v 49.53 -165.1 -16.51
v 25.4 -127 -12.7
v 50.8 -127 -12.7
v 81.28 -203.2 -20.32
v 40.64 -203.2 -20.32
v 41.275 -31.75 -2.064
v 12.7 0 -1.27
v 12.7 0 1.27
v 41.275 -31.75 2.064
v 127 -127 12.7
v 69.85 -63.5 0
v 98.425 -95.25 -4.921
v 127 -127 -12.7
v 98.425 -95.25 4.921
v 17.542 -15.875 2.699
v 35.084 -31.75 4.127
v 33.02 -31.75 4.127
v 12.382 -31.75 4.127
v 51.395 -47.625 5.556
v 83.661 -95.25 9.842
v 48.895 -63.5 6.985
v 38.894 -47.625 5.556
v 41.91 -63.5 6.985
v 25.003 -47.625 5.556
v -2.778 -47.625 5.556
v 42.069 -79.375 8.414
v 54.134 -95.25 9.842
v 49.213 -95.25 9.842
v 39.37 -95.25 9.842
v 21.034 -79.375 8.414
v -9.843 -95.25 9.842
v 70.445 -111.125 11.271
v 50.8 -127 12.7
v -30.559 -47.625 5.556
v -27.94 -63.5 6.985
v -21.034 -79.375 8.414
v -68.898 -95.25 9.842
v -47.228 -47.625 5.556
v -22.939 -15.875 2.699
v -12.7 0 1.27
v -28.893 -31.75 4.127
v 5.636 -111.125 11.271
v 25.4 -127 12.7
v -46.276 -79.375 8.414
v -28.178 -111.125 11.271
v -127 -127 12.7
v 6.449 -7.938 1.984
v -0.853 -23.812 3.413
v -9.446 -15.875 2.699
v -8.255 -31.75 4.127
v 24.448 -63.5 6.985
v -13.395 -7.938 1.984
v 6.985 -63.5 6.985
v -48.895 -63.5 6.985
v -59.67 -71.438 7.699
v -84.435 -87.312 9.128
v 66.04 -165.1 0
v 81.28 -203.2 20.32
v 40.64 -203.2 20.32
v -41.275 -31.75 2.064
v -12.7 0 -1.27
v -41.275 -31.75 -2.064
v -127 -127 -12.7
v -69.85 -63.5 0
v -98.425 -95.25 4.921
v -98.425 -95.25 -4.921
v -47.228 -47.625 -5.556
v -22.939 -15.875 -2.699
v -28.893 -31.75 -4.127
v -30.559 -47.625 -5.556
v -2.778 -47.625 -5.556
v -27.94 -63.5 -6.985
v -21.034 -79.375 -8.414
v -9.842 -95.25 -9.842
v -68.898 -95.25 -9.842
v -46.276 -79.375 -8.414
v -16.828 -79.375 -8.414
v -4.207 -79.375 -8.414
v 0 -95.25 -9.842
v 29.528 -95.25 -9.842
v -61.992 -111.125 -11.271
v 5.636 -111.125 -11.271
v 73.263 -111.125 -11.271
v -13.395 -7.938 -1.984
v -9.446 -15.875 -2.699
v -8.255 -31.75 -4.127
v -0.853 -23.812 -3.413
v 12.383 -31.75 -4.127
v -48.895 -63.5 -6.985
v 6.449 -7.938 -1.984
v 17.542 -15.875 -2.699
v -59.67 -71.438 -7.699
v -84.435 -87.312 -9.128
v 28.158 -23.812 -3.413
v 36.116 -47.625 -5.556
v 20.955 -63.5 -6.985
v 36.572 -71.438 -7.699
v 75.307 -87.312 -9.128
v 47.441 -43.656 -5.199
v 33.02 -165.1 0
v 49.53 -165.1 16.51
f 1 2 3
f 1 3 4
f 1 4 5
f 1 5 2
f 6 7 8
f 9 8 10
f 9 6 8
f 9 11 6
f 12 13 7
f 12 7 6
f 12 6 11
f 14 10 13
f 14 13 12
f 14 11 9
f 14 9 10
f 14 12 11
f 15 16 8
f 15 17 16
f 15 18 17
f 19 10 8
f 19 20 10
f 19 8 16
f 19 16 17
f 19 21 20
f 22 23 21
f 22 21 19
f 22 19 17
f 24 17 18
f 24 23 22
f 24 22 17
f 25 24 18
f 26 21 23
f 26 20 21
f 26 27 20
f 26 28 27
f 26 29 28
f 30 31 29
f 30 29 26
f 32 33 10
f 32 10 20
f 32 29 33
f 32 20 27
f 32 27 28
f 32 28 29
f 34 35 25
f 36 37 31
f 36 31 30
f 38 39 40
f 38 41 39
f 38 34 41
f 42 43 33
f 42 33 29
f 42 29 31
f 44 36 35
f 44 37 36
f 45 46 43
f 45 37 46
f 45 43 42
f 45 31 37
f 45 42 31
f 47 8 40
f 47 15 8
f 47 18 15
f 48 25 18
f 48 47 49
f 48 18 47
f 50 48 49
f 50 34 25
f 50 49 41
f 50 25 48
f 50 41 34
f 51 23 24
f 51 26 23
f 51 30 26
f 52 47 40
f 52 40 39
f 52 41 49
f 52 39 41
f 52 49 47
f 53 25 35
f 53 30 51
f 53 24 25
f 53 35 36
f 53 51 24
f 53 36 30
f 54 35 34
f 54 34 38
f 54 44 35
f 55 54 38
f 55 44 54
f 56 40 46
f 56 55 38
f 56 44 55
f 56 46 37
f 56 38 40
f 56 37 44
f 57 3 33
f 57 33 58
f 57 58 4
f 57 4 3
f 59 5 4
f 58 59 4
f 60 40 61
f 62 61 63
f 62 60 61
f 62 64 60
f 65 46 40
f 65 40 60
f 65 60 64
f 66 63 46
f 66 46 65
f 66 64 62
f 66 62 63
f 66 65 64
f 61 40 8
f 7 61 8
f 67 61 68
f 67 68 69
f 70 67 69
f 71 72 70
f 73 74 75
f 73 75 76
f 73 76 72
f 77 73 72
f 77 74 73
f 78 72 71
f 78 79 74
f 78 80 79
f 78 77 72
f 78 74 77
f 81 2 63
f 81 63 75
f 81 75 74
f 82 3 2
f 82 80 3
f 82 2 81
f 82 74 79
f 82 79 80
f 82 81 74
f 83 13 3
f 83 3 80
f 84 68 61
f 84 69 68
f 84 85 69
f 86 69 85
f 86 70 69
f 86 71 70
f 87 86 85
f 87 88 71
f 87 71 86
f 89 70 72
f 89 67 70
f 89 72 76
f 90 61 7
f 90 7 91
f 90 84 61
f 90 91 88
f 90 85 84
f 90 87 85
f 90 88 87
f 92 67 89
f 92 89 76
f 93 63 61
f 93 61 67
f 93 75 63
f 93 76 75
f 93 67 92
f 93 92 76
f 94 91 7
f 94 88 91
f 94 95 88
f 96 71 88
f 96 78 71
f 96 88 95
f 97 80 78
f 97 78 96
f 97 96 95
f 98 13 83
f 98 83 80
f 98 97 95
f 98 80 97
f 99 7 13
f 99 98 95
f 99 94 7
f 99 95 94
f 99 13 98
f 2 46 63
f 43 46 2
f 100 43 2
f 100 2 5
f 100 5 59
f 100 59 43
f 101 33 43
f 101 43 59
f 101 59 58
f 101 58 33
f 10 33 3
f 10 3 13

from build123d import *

# Parameters (mm, degrees)
F0_W = 25.4
F0_H = 2.54
F2_W = 254
F2_H = 25.4
F4_W = 25.4
F4_H = 25.4
F6_W = 40.64
F6_H = 40.64


with BuildPart() as f3:
    # F0 (on Front) → F3 section 0
    with BuildSketch(Plane.XZ):
        Rectangle(F0_W, F0_H)
    # F2 (on offset) → F3 section 1
    with BuildSketch(Plane.XZ.offset(127)):
        Rectangle(F2_W, F2_H)
    loft()

    # F4 (on face) → F7 section 0
    with BuildSketch(Plane.XZ.offset(127)):
        with Locations((38.1, 0)):
            Rectangle(F4_W, F4_H)
    # F6 (on offset) → F7 section 1
    with BuildSketch(Plane.XZ.offset(203.2)):
        with Locations((60.96, 0)):
            Rectangle(F6_W, F6_H)
    loft()


solid = f3.part
